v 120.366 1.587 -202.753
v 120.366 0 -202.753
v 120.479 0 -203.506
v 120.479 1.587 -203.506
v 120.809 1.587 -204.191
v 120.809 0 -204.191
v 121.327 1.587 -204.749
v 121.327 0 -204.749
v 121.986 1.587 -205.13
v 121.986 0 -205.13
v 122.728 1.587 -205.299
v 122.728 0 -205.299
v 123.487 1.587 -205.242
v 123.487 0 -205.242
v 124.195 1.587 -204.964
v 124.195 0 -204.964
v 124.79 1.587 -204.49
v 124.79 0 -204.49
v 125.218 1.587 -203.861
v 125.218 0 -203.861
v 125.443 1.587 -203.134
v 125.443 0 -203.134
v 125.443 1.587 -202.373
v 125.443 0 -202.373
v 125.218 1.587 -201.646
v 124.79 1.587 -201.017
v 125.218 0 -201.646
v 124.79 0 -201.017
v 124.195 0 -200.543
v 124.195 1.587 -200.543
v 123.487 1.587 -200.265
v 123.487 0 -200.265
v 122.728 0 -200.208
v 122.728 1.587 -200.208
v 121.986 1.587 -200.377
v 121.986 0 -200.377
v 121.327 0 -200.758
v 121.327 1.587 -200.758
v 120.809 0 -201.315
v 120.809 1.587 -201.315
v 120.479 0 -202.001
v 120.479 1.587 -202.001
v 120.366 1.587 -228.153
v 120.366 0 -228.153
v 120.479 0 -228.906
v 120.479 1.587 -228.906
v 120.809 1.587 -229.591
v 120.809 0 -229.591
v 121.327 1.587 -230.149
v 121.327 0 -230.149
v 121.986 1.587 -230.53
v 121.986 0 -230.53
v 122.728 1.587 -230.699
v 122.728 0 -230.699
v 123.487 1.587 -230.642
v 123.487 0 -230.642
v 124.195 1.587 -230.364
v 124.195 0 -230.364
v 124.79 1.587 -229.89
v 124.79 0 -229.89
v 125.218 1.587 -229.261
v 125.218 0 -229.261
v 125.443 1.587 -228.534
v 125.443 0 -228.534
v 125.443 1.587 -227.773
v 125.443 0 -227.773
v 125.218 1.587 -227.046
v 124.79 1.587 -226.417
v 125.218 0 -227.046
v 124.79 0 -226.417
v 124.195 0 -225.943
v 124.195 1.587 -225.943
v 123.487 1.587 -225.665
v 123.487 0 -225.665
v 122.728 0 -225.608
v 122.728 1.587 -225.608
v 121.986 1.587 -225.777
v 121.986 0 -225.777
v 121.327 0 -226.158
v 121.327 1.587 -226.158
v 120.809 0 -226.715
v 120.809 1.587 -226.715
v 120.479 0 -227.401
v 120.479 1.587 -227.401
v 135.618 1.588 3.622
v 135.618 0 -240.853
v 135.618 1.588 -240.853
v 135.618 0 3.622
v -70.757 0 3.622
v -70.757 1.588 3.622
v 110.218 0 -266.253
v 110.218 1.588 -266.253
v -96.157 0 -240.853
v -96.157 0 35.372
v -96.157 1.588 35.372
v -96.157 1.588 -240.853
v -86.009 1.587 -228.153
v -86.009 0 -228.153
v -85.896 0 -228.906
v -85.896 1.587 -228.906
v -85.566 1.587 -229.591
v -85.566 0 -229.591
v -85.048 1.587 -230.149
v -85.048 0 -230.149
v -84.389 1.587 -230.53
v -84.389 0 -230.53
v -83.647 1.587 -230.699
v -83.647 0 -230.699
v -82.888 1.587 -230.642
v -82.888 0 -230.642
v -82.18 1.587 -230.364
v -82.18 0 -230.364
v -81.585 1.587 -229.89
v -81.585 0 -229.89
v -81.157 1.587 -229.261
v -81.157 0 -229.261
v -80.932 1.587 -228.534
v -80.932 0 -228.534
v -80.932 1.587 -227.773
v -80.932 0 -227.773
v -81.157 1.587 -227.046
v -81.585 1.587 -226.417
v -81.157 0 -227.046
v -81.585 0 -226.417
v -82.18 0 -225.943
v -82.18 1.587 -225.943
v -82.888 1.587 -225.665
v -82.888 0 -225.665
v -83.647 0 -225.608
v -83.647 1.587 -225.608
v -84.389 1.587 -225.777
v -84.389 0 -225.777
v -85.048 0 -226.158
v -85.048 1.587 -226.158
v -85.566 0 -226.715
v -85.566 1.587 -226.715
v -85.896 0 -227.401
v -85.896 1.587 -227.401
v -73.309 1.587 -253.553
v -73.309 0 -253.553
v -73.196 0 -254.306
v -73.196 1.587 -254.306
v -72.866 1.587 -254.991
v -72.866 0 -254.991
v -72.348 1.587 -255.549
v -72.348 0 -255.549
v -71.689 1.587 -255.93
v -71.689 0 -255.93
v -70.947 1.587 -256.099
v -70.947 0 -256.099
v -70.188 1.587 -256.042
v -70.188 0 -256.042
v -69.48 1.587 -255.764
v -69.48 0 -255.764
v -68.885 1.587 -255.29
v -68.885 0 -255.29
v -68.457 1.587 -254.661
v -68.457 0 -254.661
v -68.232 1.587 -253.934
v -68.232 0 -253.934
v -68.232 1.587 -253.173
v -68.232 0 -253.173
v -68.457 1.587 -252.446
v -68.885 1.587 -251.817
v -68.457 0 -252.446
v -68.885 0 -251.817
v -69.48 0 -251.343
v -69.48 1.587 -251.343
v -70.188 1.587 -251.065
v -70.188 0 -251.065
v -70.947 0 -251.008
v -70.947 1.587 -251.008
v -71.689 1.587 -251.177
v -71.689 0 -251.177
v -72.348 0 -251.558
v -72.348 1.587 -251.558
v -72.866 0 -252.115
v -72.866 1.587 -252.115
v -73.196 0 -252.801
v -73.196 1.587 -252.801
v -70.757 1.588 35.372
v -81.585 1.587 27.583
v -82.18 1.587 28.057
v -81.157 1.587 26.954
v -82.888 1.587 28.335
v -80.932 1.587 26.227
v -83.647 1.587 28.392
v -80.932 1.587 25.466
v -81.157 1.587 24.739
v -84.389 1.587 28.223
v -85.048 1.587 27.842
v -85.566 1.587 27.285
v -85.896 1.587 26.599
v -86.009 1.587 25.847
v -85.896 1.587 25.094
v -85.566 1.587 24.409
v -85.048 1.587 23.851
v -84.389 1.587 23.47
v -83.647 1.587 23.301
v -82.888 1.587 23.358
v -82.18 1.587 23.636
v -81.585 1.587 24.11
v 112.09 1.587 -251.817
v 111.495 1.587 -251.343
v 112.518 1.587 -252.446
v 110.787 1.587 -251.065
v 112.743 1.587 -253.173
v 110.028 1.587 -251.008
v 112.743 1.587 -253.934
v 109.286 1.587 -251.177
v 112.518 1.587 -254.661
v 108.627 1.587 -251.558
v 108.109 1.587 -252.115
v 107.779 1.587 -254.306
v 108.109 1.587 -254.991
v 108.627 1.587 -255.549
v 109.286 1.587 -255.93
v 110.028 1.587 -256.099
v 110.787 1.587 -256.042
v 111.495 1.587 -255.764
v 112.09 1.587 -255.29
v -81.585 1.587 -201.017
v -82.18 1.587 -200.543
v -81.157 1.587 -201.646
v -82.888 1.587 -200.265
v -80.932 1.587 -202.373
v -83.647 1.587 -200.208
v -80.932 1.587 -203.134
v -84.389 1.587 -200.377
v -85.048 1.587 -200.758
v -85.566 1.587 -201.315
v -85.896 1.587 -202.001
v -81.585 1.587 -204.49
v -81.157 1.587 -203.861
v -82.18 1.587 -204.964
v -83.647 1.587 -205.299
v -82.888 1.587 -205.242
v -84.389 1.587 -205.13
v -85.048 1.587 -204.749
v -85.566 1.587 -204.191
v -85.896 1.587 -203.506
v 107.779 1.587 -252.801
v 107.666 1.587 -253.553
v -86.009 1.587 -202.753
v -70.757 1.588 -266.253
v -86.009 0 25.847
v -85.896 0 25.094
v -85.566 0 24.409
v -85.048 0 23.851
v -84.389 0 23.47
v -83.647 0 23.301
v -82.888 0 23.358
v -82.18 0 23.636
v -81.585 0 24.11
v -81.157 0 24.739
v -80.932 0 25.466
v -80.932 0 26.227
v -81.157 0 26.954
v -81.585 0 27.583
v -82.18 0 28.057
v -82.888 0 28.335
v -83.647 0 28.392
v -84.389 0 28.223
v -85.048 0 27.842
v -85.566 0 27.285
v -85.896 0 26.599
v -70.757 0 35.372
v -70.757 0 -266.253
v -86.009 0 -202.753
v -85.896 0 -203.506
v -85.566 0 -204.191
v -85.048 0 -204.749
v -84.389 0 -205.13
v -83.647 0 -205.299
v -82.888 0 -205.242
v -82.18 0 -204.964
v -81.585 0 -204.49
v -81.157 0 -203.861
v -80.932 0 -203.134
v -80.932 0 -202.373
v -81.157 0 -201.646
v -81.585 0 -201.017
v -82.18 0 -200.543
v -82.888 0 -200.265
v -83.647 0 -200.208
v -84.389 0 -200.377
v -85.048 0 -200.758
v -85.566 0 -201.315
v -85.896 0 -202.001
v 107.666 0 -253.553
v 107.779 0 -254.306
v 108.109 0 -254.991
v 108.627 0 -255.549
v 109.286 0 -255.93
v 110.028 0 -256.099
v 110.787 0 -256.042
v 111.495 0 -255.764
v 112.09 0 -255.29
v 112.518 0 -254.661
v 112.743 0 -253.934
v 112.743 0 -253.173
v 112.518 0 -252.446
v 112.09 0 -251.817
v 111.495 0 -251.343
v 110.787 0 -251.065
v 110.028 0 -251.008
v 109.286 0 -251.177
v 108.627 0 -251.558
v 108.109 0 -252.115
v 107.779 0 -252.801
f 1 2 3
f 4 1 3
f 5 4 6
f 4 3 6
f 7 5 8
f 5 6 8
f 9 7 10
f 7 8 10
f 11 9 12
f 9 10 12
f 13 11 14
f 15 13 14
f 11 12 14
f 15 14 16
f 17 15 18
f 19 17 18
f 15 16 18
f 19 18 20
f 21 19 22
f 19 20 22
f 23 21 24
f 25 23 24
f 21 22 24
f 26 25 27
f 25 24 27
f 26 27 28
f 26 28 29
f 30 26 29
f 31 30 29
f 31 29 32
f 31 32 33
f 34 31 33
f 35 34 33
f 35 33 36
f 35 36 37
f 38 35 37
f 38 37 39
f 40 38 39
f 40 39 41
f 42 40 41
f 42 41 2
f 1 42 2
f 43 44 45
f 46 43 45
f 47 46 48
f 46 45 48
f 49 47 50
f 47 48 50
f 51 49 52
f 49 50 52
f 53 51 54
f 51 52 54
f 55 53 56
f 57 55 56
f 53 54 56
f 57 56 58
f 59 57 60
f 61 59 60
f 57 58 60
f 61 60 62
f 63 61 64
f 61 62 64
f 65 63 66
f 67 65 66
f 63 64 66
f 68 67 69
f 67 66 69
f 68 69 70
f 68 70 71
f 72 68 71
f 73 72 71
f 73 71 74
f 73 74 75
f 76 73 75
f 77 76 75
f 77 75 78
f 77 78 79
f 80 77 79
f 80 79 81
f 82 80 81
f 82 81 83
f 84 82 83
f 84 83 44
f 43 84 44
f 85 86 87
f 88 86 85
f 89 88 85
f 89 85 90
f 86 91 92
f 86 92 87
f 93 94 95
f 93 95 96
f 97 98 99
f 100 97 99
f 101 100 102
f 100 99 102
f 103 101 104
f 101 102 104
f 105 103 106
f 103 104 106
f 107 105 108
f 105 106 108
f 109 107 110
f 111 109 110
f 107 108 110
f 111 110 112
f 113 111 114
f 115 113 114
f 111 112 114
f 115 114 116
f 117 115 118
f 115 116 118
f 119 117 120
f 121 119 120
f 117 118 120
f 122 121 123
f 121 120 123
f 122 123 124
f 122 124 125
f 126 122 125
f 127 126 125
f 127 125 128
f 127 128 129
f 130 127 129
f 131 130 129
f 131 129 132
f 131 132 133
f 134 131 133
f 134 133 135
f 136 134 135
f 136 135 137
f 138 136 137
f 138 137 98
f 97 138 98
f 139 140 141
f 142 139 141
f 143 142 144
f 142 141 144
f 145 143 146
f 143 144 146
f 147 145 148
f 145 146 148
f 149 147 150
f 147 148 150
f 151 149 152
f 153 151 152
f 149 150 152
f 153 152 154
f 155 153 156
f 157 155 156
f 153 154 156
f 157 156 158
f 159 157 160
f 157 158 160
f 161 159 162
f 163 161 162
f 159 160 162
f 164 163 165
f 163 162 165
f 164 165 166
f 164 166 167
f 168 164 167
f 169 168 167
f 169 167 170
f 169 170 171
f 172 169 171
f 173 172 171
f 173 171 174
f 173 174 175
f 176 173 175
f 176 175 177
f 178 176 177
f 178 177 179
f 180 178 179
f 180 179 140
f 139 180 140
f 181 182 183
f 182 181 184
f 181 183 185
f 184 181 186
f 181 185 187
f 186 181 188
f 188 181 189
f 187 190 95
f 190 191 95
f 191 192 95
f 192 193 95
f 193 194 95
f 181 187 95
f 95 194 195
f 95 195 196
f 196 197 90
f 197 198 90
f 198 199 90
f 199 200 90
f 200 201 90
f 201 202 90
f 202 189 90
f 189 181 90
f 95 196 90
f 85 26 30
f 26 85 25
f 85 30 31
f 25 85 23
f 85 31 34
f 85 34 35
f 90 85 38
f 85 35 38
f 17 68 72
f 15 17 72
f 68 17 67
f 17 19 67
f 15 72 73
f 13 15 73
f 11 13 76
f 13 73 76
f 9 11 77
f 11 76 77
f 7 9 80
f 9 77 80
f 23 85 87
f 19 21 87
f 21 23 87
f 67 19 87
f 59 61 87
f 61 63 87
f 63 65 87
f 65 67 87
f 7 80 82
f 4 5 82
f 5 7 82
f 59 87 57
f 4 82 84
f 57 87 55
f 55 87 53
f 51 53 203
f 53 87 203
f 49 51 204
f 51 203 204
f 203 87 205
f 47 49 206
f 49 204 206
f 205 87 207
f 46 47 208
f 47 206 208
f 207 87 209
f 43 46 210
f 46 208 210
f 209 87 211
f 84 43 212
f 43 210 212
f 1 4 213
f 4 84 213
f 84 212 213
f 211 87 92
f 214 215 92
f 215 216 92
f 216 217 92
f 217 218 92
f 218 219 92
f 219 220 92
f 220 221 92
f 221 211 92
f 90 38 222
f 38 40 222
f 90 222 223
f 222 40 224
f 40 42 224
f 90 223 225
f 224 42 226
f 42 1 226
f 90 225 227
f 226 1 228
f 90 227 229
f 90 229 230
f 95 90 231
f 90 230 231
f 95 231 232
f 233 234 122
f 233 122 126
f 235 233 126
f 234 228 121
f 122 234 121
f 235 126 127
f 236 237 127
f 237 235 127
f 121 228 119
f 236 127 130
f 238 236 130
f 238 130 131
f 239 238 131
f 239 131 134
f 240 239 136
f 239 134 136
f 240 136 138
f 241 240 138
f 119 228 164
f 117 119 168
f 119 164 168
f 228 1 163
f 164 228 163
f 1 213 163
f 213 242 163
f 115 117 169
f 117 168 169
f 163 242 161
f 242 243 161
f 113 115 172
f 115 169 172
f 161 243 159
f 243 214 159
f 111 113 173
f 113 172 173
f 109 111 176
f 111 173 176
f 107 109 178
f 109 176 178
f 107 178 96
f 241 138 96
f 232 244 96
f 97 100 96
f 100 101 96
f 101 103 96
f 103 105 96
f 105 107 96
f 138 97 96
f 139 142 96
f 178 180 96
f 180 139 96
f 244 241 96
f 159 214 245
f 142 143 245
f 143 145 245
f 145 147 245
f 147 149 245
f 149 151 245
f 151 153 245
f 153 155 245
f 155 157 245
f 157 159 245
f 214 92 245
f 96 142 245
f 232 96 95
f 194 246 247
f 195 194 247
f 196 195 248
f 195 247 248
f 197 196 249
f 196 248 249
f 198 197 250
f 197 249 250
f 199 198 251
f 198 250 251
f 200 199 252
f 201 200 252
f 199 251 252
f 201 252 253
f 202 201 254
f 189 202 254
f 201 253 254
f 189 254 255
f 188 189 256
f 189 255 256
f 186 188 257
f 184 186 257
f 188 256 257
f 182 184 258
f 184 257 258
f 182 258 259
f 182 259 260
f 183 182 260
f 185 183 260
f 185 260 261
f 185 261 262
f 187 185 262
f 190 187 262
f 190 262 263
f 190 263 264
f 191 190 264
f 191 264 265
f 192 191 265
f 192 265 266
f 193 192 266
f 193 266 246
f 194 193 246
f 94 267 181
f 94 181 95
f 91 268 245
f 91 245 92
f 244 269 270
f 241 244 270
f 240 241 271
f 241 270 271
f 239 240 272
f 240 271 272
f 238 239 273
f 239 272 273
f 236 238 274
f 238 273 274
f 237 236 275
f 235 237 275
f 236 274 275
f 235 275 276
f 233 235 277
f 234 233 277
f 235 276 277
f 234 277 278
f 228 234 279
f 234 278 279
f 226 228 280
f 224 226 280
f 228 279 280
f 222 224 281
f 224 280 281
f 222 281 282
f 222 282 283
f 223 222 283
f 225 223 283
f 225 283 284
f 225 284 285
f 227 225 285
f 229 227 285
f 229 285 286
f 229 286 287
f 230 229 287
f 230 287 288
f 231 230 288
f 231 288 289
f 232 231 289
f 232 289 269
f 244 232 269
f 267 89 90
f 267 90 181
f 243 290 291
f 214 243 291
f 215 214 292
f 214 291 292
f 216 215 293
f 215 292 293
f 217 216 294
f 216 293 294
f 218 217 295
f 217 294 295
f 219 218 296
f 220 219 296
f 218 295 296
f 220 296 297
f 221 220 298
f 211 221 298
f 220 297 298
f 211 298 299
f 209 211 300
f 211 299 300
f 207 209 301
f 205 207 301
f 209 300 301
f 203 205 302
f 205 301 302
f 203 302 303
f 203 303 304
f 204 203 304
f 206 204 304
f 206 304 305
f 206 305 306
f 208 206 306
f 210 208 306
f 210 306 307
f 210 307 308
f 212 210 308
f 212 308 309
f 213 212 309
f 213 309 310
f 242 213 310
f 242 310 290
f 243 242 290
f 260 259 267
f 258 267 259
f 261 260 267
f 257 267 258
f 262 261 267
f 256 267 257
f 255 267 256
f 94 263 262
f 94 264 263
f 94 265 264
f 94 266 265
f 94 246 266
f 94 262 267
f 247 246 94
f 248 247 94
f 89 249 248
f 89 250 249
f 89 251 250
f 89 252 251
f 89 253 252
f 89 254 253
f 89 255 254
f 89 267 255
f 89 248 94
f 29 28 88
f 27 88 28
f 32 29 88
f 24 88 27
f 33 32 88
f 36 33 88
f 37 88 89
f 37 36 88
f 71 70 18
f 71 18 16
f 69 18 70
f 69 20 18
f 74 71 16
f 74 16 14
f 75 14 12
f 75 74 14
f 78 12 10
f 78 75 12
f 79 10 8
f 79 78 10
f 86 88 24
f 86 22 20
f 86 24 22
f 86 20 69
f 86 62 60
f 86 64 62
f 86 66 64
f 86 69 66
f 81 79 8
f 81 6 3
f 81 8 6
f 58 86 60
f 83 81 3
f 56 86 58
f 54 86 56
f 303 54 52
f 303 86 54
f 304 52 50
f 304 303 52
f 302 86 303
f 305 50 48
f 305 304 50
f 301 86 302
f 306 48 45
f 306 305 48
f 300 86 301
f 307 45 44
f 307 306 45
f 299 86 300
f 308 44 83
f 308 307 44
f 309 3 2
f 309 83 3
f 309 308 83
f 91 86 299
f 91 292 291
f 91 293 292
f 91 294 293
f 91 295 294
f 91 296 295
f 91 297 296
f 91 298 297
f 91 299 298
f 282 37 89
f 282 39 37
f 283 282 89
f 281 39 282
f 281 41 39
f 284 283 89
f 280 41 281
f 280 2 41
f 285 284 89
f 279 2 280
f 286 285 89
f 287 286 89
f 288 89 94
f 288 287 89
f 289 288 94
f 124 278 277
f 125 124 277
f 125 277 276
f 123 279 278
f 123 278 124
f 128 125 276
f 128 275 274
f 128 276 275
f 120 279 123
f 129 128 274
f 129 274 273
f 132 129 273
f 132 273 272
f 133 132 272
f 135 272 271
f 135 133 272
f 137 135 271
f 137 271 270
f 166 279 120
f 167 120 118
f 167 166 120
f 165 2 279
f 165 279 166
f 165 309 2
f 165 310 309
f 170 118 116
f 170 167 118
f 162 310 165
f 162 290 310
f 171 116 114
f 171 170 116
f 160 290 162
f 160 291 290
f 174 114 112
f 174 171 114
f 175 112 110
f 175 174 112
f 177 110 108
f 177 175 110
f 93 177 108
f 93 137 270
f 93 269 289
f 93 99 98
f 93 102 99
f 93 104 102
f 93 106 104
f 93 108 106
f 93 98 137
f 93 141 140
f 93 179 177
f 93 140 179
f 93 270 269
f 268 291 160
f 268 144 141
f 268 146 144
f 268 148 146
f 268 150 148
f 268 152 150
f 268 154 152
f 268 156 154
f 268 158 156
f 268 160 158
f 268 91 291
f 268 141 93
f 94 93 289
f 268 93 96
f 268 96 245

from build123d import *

# Parameters (mm, degrees)
BOSS_EXTRUDE1_DEPTH    = 1.5875
F_10_CLEARANCE_HOLE1_D = 5.1054


with BuildPart() as part:
    # Sketch3 → Boss-Extrude1 (new body)
    with BuildSketch(Plane(origin=(0, 0, 0), x_dir=(1, 0, 0), z_dir=(0, 1, 0))):
        Polygon((-96.156504736, -35.371535332), (-96.156504736, 240.853464665), (-70.756504733, 266.253464668), (110.218495843, 266.253464668), (135.618495843, 240.853464668), (135.618495843, -3.621535332), (-70.756504661, -3.621535332), (-70.756504661, -35.371535332), align=None)
    extrude(amount=BOSS_EXTRUDE1_DEPTH)

    # #10 Clearance Hole1 (through all)
    with Locations(Plane(origin=(0, 1.5875, 0), x_dir=(1, 0, 0), z_dir=(0, 1, 0))):
        with Locations((-83.456504705, -25.846534826), (-83.456504732, 202.753465682), (-83.456504732, 228.153465682), (-70.756504732, 253.553465682), (122.918495843, 202.753464668), (122.918495843, 228.153464668), (110.218495843, 253.553464668)):
            Hole(F_10_CLEARANCE_HOLE1_D / 2)


solid = part.part
